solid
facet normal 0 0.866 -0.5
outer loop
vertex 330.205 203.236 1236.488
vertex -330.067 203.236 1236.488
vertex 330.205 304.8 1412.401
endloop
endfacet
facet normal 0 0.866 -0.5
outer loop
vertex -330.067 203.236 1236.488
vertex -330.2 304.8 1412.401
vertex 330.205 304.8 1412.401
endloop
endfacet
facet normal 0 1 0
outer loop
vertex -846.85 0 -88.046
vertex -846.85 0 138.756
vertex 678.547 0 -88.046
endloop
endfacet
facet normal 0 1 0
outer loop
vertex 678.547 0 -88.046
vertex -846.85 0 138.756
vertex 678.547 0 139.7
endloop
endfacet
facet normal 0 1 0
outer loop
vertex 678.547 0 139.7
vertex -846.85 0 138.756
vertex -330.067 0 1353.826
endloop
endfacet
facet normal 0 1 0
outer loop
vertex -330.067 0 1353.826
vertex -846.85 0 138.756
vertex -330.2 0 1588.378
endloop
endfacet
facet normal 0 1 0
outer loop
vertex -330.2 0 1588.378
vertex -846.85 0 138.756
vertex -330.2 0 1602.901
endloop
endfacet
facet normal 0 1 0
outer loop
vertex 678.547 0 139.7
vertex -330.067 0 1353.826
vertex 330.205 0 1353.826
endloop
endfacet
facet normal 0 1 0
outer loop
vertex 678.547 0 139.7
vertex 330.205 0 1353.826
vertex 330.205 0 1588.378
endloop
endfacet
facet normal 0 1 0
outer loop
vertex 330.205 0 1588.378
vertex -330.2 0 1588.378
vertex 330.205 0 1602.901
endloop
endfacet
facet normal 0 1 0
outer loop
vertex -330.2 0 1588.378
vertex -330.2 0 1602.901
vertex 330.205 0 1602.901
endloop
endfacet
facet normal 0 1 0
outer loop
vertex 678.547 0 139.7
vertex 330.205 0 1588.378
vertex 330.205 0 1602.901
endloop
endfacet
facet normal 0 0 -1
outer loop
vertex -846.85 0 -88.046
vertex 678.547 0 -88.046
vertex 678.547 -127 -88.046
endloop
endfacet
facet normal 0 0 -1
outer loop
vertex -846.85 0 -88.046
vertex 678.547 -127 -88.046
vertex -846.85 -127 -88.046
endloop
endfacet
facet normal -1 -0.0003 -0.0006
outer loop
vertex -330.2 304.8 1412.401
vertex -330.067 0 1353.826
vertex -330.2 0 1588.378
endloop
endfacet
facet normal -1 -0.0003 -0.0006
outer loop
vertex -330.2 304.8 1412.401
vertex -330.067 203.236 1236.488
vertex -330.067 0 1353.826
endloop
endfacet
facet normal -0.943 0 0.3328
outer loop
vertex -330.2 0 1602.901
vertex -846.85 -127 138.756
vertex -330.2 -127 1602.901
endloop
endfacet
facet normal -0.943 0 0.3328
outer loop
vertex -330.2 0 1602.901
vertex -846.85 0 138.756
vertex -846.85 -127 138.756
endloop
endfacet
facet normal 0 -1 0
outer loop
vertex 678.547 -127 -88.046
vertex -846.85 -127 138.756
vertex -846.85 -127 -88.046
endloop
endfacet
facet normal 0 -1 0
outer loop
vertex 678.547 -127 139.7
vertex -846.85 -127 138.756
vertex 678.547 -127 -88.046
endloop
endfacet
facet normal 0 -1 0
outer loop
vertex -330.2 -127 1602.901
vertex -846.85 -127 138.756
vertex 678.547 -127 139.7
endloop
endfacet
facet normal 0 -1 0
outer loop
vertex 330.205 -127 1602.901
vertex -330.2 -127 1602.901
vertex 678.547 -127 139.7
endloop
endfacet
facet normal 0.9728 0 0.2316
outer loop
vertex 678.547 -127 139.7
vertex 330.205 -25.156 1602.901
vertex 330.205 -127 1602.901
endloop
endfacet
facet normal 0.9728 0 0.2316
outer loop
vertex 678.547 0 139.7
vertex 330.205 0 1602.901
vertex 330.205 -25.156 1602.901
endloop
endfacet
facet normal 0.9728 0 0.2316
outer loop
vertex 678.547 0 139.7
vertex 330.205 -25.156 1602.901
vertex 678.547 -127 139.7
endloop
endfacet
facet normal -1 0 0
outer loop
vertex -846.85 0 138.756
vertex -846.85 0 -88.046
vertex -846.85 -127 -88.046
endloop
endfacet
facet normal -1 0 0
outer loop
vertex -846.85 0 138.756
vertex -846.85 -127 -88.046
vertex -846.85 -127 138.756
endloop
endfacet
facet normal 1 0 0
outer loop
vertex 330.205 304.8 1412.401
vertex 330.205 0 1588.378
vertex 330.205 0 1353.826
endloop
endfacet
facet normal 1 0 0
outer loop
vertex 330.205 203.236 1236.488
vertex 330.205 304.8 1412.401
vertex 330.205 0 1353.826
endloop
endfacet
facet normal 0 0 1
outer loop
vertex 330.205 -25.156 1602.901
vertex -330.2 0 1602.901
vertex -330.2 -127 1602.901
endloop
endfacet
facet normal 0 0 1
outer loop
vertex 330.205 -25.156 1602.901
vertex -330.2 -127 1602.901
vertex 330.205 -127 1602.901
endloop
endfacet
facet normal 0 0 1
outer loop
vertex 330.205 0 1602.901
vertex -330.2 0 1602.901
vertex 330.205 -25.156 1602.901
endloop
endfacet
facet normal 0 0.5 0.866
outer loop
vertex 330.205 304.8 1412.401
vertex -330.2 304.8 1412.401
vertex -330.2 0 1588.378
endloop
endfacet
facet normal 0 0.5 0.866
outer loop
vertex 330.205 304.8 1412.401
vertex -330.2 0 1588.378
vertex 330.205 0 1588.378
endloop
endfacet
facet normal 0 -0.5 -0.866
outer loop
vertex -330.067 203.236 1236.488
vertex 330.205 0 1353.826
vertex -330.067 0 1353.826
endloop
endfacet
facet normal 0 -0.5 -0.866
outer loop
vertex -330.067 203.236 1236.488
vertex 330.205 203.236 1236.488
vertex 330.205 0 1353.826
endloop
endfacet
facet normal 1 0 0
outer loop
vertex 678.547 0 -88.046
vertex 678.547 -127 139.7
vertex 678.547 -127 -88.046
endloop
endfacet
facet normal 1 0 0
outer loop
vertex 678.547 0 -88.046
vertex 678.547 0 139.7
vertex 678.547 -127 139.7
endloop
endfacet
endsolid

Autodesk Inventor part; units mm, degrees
ref_plane "YZ Plane" through (0, 0, 0) normal (1, 0, 0) x (0, 1, 0)
ref_plane "XZ Plane" through (0, 0, 0) normal (0, 1, 0) x (-1, 0, 0)
ref_plane "XY Plane" through (0, 0, 0) normal (0, 0, 1) x (1, 0, 0)
sketch "Sketch1" plane through (-330.2, 304.8, 1412.4013) normal (0, -0.866, 0.5) x (1, 0, 0)
  line L0 (0.1333, -203.1273) -> (0, 0)
  line L1 (0, 0) -> (660.4052, 0)
  line L2 (660.4052, 0) -> (660.4052, -203.1273)
  line L3 (660.4052, -203.1273) -> (0.1333, -203.1273)
  point P0 (330.2, -1375.5753)
extrude "Extrusion1" add sketch "Sketch1" along normal blind 381
sketch "Sketch2" plane through (679.7379, 0, 139.7) normal (0, -1, 0) x (1, 0, 0)
  line L0 (-1.1909, -227.7462) -> (-1526.5875, -227.7462)
  line L1 (-1526.5875, -227.7462) -> (-1526.5875, -0.9438)
  line L2 (-1009.938, 1272.7013) -> (-1009.938, 1463.2013) projected
  line L3 (-1526.5875, -0.9438) -> (-1009.938, 1463.2013)
  line L4 (-349.5327, 1287.2879) -> (-349.5327, 1463.2013) projected
  line L5 (-1009.938, 1463.2013) -> (-349.5327, 1463.2013)
  line L6 (-349.5327, 1463.2013) -> (-1.1909, 0)
  line L7 (-1.1909, 0) -> (-1.1909, -227.7462)
  point P0 (-679.7379, -139.7)
extrude "Extrusion2" add sketch "Sketch2" along normal blind 127
sketch "Sketch3" plane through (679.7379, 0, 139.7) normal (0, 1, 0) x (1, 0, 0)
  line L0 (-1.1909, 0) -> (-349.5327, -1463.2013) projected
  line L1 (-346.1567, -1449.0205) -> (-1.1909, 0)
  line L2 (-1.1909, 0) -> (-123.0131, 0)
  line L3 (-349.5327, -1096.7879) -> (-349.5327, -1214.1265) projected
  line L4 (-123.0131, 0) -> (-349.5327, -1214.1265)
  line L5 (-349.5327, -1214.1265) -> (-349.5327, -1449.0205)
  line L6 (-349.5327, -1449.0205) -> (-346.1567, -1449.0205)
  point P0 (-679.7379, 139.7)
properties part number "esp32-s3-devkitc-1 ChipUp PinsExposed Bottom (1)"
